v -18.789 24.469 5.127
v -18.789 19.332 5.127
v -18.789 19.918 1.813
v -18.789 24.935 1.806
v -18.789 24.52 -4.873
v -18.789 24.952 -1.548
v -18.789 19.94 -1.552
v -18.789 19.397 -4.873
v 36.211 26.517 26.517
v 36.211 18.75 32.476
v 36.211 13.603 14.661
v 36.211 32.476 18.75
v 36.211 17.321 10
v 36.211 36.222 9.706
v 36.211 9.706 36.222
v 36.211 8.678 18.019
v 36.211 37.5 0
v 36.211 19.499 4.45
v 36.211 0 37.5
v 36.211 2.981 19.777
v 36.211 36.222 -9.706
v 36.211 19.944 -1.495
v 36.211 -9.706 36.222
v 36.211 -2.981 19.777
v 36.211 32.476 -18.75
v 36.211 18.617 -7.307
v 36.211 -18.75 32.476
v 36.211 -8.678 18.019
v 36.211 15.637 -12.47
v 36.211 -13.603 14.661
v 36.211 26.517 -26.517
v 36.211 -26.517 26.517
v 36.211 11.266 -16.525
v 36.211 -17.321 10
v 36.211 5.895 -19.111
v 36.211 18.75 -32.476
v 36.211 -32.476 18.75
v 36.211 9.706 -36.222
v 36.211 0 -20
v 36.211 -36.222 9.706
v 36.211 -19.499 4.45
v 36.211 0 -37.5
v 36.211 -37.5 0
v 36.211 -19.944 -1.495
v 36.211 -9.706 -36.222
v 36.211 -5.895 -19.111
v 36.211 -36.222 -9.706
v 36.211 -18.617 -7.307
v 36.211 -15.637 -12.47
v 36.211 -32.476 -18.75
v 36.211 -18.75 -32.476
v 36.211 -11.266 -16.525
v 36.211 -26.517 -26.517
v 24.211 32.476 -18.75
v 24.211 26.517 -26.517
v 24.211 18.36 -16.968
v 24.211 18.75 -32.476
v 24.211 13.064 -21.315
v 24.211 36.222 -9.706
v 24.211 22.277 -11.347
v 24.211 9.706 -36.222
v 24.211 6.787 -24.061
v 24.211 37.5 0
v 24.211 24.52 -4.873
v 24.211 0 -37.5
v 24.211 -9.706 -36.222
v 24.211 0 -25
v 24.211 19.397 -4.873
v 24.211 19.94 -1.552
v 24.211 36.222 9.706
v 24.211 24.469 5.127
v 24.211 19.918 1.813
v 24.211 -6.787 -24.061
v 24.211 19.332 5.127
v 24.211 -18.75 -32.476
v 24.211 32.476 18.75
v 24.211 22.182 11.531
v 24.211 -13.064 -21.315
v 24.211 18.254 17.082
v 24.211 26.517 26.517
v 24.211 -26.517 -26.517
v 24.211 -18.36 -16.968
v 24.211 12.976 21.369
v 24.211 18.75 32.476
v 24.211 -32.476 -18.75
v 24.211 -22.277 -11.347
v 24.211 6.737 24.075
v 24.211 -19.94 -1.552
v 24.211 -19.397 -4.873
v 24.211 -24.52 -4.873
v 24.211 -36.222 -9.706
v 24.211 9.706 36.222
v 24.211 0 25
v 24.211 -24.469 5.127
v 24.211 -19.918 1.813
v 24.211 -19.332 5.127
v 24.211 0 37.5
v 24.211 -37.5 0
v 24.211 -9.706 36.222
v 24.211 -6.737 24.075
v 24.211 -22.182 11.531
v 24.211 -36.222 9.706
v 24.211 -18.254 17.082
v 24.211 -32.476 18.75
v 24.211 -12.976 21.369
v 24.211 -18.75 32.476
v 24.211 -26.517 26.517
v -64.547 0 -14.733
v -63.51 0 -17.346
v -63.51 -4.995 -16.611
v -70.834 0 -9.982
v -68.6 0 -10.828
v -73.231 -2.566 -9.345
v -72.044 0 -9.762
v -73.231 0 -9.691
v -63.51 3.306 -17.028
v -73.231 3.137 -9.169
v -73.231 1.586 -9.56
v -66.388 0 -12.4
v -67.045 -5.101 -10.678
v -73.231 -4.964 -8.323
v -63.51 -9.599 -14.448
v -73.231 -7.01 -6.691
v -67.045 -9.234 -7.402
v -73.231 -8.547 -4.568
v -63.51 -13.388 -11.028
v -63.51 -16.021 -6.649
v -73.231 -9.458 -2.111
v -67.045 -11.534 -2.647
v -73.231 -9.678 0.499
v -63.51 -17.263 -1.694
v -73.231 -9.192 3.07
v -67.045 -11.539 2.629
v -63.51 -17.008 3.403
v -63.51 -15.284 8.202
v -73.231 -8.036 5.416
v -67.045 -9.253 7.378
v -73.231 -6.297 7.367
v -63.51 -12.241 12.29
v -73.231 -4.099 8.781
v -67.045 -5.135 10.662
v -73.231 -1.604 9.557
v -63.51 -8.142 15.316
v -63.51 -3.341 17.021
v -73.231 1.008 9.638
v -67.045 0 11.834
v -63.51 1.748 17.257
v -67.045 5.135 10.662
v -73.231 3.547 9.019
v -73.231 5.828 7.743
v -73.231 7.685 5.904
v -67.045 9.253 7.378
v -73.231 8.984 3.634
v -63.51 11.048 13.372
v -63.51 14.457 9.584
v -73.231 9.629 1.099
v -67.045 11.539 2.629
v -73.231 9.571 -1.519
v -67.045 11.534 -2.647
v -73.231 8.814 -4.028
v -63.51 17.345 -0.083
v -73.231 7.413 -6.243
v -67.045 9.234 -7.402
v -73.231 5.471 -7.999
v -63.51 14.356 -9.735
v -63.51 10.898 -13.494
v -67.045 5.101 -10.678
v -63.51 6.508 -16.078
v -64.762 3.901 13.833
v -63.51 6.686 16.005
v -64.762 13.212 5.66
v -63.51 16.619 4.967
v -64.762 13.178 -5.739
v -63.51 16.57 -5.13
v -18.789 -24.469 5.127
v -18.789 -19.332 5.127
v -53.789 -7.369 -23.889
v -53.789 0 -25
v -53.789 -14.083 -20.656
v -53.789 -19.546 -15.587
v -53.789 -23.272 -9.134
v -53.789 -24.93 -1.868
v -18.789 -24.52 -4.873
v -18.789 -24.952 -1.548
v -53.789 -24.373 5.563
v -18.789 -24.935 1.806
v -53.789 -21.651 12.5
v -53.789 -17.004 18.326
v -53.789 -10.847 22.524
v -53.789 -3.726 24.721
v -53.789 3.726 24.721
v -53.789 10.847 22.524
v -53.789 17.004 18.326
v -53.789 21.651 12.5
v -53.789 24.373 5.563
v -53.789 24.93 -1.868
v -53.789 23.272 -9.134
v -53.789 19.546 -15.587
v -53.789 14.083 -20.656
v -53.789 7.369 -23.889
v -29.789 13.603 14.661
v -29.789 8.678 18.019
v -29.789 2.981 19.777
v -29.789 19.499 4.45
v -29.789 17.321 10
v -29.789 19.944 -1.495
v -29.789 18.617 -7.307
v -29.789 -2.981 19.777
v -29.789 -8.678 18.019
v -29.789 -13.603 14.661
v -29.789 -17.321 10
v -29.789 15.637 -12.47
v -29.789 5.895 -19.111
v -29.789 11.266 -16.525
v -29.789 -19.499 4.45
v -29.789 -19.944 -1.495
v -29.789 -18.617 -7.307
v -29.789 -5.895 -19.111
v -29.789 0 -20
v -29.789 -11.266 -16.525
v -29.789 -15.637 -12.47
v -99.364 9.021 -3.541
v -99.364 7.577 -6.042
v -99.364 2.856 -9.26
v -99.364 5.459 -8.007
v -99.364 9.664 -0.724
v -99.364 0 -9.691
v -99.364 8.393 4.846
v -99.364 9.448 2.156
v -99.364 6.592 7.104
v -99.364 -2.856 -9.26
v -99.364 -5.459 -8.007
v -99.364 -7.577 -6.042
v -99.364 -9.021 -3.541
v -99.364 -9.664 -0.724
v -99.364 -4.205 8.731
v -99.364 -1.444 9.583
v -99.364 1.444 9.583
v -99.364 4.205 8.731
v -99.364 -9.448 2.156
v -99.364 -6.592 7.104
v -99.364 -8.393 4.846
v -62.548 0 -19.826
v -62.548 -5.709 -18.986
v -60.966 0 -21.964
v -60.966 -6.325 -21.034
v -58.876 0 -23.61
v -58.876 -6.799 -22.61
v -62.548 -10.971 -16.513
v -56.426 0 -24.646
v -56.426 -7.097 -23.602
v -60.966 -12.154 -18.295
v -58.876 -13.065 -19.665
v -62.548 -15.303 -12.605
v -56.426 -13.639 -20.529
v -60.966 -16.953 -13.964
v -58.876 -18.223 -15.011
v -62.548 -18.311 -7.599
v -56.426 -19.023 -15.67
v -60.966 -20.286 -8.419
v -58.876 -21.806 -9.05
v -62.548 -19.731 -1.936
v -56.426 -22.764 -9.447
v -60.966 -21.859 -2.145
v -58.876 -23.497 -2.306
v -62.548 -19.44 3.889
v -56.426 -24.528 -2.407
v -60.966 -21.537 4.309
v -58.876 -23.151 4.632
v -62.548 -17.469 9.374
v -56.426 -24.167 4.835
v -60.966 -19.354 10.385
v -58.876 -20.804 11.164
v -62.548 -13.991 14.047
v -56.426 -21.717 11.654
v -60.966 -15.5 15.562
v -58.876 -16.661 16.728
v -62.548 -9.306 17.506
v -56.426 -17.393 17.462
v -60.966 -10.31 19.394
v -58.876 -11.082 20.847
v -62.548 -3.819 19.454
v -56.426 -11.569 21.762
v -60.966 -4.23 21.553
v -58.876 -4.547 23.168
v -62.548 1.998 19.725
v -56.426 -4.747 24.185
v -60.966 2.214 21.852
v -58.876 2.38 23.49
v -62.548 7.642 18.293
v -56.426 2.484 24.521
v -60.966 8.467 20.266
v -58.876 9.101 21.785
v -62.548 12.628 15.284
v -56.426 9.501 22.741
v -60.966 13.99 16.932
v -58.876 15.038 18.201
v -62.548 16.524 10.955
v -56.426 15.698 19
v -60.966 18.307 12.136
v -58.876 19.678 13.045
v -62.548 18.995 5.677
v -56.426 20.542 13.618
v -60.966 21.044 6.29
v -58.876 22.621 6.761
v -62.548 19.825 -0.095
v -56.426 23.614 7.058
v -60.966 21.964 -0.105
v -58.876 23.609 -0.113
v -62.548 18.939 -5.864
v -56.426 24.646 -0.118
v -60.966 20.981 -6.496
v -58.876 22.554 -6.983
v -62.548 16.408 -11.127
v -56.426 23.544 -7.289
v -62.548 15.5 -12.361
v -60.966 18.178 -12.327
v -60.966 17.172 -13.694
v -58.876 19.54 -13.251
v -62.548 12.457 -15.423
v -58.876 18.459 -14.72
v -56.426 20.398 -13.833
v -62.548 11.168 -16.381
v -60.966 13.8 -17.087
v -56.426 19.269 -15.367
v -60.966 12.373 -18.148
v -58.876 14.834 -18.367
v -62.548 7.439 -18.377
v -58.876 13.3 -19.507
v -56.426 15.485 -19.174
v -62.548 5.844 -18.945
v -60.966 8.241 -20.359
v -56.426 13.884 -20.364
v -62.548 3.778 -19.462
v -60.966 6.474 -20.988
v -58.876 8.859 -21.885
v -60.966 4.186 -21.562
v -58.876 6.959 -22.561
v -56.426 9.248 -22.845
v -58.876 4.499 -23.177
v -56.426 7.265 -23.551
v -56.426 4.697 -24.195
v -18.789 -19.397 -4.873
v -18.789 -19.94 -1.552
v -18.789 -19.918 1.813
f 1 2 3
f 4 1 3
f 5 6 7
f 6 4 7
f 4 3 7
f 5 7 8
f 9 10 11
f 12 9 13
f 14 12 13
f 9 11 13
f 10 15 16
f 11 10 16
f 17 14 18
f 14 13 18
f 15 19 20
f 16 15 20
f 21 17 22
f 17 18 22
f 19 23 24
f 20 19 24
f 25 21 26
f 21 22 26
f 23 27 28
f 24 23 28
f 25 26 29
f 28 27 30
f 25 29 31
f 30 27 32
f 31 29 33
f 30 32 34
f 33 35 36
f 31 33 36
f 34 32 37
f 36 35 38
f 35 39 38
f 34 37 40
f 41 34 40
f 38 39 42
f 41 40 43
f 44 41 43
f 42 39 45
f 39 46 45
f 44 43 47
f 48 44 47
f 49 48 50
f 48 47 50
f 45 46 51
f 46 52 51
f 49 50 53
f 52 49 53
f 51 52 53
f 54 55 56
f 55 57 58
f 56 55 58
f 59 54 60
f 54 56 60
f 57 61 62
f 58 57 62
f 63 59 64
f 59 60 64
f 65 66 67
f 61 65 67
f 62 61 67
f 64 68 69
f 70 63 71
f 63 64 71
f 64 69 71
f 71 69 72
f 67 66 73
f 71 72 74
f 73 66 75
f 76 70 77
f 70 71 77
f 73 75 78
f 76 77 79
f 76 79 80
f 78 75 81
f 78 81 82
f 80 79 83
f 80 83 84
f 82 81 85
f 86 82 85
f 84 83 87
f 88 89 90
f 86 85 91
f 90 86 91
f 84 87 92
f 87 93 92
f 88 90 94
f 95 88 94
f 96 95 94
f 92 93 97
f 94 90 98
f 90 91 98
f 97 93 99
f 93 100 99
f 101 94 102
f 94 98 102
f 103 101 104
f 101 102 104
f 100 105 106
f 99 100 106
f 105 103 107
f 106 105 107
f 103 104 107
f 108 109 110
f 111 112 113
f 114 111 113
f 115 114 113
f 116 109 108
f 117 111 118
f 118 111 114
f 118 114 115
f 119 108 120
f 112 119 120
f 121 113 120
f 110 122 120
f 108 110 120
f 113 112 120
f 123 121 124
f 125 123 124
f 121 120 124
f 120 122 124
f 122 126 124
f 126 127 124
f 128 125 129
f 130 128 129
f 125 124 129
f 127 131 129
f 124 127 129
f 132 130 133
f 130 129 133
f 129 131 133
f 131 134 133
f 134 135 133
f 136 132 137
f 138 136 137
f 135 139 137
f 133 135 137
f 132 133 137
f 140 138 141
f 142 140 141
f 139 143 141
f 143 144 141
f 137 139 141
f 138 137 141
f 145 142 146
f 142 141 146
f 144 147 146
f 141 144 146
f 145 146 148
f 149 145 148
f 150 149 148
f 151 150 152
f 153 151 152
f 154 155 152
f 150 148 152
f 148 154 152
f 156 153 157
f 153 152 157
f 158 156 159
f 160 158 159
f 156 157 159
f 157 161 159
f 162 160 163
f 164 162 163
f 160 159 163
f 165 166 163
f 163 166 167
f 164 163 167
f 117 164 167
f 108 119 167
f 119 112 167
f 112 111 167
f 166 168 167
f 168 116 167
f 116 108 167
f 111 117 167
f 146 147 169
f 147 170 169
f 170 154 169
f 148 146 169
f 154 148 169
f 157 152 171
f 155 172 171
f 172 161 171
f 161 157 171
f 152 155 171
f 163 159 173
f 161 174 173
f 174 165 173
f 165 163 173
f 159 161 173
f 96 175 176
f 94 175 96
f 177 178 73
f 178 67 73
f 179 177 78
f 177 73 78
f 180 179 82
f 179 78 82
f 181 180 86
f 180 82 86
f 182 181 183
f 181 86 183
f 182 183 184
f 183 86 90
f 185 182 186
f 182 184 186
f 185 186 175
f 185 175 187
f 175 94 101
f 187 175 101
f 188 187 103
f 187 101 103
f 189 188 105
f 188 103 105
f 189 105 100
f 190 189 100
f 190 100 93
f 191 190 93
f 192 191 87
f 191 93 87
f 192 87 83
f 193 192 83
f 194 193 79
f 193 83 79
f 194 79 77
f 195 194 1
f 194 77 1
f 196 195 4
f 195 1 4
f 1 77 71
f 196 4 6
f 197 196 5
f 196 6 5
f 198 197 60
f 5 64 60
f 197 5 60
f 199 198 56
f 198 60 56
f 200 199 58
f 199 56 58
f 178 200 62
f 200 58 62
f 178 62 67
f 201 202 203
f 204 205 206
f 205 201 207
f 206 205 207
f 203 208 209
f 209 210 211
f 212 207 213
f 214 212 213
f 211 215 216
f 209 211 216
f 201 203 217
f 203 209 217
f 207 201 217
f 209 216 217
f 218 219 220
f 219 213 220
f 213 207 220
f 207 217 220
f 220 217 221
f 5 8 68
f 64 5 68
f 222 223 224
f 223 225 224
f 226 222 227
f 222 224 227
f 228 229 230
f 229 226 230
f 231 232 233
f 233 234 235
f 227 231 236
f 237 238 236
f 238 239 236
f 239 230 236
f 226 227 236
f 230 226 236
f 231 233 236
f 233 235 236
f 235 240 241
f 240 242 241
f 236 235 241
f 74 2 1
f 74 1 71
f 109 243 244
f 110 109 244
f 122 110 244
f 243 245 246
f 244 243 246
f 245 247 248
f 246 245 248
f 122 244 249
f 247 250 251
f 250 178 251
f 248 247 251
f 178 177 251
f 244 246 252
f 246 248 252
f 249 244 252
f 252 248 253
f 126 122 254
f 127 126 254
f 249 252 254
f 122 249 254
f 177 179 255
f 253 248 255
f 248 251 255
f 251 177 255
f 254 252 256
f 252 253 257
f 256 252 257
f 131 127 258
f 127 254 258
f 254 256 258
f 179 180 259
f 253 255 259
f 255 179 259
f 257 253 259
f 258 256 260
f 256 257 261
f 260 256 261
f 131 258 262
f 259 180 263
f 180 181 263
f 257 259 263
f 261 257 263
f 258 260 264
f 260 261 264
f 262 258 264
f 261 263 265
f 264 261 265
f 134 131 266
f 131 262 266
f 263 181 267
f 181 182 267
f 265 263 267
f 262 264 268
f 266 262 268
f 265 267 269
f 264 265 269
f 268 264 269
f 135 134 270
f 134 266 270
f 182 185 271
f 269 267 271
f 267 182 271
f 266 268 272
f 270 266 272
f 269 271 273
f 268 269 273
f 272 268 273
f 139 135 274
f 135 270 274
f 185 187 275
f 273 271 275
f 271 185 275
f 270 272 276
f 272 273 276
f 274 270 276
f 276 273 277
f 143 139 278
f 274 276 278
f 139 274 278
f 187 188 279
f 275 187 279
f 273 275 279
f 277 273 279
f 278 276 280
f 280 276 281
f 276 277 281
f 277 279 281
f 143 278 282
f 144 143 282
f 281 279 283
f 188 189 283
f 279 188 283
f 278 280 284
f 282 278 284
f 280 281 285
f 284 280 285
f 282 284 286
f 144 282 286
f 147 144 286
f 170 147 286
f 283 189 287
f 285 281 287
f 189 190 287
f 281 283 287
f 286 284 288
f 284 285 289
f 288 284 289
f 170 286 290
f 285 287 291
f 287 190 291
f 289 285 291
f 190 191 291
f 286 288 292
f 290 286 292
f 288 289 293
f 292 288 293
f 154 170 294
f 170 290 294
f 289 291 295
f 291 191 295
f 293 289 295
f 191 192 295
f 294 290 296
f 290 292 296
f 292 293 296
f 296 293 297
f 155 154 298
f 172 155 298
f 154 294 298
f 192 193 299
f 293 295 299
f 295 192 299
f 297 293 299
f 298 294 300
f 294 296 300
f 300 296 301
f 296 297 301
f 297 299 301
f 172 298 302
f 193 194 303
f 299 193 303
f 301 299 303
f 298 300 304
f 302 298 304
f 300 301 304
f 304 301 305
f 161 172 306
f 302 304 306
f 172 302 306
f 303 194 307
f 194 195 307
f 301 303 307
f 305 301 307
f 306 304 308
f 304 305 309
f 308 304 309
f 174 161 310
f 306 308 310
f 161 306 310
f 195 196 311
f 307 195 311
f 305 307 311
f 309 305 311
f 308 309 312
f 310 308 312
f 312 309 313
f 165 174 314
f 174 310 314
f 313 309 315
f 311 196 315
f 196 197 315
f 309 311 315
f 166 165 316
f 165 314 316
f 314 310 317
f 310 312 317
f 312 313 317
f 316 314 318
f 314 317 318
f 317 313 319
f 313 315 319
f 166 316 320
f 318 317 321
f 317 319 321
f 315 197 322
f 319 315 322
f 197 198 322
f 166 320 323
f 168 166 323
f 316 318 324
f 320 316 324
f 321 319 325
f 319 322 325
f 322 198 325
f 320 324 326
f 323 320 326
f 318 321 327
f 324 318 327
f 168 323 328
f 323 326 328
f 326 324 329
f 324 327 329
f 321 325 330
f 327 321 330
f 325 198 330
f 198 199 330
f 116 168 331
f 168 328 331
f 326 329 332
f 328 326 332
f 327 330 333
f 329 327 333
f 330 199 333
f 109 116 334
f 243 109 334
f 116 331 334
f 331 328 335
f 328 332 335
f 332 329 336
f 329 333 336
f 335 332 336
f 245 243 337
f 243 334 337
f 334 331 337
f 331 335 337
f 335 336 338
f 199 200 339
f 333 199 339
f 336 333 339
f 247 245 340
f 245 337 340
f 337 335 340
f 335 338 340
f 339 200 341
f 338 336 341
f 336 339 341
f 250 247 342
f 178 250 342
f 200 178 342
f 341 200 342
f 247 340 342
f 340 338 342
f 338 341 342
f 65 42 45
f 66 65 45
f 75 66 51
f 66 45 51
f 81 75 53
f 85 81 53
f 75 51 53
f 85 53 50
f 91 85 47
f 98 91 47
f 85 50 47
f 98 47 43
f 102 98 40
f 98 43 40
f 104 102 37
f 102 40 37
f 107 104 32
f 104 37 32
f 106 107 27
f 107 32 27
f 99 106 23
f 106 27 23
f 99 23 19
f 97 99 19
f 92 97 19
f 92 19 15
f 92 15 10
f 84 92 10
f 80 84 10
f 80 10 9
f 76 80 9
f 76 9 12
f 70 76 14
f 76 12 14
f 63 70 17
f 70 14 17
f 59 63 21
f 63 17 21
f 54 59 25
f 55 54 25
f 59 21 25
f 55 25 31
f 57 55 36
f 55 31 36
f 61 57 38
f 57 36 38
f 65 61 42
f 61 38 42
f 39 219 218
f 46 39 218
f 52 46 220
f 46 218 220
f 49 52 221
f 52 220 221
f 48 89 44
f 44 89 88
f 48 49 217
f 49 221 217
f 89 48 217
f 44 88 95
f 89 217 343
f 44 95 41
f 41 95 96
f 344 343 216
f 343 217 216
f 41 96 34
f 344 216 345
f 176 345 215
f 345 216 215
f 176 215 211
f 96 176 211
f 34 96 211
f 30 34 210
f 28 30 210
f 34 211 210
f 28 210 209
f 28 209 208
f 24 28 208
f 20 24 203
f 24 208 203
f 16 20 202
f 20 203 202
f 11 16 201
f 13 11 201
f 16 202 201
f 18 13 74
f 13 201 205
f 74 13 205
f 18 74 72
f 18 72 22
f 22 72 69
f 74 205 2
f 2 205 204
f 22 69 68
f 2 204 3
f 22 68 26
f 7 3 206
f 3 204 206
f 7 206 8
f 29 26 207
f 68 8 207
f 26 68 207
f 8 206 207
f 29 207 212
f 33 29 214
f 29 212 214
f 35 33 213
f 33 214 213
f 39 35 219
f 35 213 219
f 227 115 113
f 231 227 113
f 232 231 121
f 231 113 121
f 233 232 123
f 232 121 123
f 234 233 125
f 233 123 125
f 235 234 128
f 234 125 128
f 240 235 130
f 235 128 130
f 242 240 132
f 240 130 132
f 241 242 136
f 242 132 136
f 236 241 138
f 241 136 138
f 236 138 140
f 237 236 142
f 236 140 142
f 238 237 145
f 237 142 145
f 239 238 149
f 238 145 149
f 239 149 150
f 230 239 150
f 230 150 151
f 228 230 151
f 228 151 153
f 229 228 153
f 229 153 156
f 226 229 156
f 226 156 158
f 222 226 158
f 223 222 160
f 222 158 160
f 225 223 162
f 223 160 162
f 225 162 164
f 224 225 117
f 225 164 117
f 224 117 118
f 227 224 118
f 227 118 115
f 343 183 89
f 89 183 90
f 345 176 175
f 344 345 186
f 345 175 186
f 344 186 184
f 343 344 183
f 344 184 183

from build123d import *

# Parameters (mm, degrees)
FILLET1_R               = 10
FILLET2_R               = 10
CUT_EXTRUDE1_DEPTH      = 113.630542396
CUT_EXTRUDE1_DEPTH_BACK = 113.630542396
SKETCH2_W               = 43
SKETCH2_H               = 10


with BuildPart() as part:
    # Sketch1 → Revolve1 (revolve)
    with BuildSketch(Plane(origin=(0, 0, 0), x_dir=(1, 0, 0), z_dir=(0, 1, 0))):
        Polygon((-99.363670728, 9.691024676), (-63.789023183, 9.691024676), (-63.789023183, 25), (24.210976817, 25), (24.210976817, 37.5), (36.210976817, 37.5), (36.210976817, 20), (-29.789023183, 20), (-29.789023183, 0), (-99.363670728, 0), align=None)
    revolve(axis=Axis((-29.789023183, 0, 0), (-1, 0, 0)))

    # Fillet1
    fillet1_edges = [part.edges().sort_by_distance(p)[0] for p in [
        (-63.789023183, 0, 25),
    ]]
    fillet(fillet1_edges, radius=FILLET1_R)

    # Fillet2
    fillet2_edges = [part.edges().sort_by_distance(p)[0] for p in [
        (-63.789023183, 0, 9.691024676),
    ]]
    fillet(fillet2_edges, radius=FILLET2_R)

    # Sketch2 → Cut-Extrude1 (cut, two sides: drawn at the far end of the back side and taken through both)
    with BuildSketch(Plane(origin=(0, 0, 0), x_dir=(1, 0, 0), z_dir=(0, 1, 0)).offset(-CUT_EXTRUDE1_DEPTH_BACK)):
        with Locations((2.710976817, -0.126659564)):
            Rectangle(SKETCH2_W, SKETCH2_H)
    extrude(amount=CUT_EXTRUDE1_DEPTH + CUT_EXTRUDE1_DEPTH_BACK, mode=Mode.SUBTRACT)


solid = part.part
